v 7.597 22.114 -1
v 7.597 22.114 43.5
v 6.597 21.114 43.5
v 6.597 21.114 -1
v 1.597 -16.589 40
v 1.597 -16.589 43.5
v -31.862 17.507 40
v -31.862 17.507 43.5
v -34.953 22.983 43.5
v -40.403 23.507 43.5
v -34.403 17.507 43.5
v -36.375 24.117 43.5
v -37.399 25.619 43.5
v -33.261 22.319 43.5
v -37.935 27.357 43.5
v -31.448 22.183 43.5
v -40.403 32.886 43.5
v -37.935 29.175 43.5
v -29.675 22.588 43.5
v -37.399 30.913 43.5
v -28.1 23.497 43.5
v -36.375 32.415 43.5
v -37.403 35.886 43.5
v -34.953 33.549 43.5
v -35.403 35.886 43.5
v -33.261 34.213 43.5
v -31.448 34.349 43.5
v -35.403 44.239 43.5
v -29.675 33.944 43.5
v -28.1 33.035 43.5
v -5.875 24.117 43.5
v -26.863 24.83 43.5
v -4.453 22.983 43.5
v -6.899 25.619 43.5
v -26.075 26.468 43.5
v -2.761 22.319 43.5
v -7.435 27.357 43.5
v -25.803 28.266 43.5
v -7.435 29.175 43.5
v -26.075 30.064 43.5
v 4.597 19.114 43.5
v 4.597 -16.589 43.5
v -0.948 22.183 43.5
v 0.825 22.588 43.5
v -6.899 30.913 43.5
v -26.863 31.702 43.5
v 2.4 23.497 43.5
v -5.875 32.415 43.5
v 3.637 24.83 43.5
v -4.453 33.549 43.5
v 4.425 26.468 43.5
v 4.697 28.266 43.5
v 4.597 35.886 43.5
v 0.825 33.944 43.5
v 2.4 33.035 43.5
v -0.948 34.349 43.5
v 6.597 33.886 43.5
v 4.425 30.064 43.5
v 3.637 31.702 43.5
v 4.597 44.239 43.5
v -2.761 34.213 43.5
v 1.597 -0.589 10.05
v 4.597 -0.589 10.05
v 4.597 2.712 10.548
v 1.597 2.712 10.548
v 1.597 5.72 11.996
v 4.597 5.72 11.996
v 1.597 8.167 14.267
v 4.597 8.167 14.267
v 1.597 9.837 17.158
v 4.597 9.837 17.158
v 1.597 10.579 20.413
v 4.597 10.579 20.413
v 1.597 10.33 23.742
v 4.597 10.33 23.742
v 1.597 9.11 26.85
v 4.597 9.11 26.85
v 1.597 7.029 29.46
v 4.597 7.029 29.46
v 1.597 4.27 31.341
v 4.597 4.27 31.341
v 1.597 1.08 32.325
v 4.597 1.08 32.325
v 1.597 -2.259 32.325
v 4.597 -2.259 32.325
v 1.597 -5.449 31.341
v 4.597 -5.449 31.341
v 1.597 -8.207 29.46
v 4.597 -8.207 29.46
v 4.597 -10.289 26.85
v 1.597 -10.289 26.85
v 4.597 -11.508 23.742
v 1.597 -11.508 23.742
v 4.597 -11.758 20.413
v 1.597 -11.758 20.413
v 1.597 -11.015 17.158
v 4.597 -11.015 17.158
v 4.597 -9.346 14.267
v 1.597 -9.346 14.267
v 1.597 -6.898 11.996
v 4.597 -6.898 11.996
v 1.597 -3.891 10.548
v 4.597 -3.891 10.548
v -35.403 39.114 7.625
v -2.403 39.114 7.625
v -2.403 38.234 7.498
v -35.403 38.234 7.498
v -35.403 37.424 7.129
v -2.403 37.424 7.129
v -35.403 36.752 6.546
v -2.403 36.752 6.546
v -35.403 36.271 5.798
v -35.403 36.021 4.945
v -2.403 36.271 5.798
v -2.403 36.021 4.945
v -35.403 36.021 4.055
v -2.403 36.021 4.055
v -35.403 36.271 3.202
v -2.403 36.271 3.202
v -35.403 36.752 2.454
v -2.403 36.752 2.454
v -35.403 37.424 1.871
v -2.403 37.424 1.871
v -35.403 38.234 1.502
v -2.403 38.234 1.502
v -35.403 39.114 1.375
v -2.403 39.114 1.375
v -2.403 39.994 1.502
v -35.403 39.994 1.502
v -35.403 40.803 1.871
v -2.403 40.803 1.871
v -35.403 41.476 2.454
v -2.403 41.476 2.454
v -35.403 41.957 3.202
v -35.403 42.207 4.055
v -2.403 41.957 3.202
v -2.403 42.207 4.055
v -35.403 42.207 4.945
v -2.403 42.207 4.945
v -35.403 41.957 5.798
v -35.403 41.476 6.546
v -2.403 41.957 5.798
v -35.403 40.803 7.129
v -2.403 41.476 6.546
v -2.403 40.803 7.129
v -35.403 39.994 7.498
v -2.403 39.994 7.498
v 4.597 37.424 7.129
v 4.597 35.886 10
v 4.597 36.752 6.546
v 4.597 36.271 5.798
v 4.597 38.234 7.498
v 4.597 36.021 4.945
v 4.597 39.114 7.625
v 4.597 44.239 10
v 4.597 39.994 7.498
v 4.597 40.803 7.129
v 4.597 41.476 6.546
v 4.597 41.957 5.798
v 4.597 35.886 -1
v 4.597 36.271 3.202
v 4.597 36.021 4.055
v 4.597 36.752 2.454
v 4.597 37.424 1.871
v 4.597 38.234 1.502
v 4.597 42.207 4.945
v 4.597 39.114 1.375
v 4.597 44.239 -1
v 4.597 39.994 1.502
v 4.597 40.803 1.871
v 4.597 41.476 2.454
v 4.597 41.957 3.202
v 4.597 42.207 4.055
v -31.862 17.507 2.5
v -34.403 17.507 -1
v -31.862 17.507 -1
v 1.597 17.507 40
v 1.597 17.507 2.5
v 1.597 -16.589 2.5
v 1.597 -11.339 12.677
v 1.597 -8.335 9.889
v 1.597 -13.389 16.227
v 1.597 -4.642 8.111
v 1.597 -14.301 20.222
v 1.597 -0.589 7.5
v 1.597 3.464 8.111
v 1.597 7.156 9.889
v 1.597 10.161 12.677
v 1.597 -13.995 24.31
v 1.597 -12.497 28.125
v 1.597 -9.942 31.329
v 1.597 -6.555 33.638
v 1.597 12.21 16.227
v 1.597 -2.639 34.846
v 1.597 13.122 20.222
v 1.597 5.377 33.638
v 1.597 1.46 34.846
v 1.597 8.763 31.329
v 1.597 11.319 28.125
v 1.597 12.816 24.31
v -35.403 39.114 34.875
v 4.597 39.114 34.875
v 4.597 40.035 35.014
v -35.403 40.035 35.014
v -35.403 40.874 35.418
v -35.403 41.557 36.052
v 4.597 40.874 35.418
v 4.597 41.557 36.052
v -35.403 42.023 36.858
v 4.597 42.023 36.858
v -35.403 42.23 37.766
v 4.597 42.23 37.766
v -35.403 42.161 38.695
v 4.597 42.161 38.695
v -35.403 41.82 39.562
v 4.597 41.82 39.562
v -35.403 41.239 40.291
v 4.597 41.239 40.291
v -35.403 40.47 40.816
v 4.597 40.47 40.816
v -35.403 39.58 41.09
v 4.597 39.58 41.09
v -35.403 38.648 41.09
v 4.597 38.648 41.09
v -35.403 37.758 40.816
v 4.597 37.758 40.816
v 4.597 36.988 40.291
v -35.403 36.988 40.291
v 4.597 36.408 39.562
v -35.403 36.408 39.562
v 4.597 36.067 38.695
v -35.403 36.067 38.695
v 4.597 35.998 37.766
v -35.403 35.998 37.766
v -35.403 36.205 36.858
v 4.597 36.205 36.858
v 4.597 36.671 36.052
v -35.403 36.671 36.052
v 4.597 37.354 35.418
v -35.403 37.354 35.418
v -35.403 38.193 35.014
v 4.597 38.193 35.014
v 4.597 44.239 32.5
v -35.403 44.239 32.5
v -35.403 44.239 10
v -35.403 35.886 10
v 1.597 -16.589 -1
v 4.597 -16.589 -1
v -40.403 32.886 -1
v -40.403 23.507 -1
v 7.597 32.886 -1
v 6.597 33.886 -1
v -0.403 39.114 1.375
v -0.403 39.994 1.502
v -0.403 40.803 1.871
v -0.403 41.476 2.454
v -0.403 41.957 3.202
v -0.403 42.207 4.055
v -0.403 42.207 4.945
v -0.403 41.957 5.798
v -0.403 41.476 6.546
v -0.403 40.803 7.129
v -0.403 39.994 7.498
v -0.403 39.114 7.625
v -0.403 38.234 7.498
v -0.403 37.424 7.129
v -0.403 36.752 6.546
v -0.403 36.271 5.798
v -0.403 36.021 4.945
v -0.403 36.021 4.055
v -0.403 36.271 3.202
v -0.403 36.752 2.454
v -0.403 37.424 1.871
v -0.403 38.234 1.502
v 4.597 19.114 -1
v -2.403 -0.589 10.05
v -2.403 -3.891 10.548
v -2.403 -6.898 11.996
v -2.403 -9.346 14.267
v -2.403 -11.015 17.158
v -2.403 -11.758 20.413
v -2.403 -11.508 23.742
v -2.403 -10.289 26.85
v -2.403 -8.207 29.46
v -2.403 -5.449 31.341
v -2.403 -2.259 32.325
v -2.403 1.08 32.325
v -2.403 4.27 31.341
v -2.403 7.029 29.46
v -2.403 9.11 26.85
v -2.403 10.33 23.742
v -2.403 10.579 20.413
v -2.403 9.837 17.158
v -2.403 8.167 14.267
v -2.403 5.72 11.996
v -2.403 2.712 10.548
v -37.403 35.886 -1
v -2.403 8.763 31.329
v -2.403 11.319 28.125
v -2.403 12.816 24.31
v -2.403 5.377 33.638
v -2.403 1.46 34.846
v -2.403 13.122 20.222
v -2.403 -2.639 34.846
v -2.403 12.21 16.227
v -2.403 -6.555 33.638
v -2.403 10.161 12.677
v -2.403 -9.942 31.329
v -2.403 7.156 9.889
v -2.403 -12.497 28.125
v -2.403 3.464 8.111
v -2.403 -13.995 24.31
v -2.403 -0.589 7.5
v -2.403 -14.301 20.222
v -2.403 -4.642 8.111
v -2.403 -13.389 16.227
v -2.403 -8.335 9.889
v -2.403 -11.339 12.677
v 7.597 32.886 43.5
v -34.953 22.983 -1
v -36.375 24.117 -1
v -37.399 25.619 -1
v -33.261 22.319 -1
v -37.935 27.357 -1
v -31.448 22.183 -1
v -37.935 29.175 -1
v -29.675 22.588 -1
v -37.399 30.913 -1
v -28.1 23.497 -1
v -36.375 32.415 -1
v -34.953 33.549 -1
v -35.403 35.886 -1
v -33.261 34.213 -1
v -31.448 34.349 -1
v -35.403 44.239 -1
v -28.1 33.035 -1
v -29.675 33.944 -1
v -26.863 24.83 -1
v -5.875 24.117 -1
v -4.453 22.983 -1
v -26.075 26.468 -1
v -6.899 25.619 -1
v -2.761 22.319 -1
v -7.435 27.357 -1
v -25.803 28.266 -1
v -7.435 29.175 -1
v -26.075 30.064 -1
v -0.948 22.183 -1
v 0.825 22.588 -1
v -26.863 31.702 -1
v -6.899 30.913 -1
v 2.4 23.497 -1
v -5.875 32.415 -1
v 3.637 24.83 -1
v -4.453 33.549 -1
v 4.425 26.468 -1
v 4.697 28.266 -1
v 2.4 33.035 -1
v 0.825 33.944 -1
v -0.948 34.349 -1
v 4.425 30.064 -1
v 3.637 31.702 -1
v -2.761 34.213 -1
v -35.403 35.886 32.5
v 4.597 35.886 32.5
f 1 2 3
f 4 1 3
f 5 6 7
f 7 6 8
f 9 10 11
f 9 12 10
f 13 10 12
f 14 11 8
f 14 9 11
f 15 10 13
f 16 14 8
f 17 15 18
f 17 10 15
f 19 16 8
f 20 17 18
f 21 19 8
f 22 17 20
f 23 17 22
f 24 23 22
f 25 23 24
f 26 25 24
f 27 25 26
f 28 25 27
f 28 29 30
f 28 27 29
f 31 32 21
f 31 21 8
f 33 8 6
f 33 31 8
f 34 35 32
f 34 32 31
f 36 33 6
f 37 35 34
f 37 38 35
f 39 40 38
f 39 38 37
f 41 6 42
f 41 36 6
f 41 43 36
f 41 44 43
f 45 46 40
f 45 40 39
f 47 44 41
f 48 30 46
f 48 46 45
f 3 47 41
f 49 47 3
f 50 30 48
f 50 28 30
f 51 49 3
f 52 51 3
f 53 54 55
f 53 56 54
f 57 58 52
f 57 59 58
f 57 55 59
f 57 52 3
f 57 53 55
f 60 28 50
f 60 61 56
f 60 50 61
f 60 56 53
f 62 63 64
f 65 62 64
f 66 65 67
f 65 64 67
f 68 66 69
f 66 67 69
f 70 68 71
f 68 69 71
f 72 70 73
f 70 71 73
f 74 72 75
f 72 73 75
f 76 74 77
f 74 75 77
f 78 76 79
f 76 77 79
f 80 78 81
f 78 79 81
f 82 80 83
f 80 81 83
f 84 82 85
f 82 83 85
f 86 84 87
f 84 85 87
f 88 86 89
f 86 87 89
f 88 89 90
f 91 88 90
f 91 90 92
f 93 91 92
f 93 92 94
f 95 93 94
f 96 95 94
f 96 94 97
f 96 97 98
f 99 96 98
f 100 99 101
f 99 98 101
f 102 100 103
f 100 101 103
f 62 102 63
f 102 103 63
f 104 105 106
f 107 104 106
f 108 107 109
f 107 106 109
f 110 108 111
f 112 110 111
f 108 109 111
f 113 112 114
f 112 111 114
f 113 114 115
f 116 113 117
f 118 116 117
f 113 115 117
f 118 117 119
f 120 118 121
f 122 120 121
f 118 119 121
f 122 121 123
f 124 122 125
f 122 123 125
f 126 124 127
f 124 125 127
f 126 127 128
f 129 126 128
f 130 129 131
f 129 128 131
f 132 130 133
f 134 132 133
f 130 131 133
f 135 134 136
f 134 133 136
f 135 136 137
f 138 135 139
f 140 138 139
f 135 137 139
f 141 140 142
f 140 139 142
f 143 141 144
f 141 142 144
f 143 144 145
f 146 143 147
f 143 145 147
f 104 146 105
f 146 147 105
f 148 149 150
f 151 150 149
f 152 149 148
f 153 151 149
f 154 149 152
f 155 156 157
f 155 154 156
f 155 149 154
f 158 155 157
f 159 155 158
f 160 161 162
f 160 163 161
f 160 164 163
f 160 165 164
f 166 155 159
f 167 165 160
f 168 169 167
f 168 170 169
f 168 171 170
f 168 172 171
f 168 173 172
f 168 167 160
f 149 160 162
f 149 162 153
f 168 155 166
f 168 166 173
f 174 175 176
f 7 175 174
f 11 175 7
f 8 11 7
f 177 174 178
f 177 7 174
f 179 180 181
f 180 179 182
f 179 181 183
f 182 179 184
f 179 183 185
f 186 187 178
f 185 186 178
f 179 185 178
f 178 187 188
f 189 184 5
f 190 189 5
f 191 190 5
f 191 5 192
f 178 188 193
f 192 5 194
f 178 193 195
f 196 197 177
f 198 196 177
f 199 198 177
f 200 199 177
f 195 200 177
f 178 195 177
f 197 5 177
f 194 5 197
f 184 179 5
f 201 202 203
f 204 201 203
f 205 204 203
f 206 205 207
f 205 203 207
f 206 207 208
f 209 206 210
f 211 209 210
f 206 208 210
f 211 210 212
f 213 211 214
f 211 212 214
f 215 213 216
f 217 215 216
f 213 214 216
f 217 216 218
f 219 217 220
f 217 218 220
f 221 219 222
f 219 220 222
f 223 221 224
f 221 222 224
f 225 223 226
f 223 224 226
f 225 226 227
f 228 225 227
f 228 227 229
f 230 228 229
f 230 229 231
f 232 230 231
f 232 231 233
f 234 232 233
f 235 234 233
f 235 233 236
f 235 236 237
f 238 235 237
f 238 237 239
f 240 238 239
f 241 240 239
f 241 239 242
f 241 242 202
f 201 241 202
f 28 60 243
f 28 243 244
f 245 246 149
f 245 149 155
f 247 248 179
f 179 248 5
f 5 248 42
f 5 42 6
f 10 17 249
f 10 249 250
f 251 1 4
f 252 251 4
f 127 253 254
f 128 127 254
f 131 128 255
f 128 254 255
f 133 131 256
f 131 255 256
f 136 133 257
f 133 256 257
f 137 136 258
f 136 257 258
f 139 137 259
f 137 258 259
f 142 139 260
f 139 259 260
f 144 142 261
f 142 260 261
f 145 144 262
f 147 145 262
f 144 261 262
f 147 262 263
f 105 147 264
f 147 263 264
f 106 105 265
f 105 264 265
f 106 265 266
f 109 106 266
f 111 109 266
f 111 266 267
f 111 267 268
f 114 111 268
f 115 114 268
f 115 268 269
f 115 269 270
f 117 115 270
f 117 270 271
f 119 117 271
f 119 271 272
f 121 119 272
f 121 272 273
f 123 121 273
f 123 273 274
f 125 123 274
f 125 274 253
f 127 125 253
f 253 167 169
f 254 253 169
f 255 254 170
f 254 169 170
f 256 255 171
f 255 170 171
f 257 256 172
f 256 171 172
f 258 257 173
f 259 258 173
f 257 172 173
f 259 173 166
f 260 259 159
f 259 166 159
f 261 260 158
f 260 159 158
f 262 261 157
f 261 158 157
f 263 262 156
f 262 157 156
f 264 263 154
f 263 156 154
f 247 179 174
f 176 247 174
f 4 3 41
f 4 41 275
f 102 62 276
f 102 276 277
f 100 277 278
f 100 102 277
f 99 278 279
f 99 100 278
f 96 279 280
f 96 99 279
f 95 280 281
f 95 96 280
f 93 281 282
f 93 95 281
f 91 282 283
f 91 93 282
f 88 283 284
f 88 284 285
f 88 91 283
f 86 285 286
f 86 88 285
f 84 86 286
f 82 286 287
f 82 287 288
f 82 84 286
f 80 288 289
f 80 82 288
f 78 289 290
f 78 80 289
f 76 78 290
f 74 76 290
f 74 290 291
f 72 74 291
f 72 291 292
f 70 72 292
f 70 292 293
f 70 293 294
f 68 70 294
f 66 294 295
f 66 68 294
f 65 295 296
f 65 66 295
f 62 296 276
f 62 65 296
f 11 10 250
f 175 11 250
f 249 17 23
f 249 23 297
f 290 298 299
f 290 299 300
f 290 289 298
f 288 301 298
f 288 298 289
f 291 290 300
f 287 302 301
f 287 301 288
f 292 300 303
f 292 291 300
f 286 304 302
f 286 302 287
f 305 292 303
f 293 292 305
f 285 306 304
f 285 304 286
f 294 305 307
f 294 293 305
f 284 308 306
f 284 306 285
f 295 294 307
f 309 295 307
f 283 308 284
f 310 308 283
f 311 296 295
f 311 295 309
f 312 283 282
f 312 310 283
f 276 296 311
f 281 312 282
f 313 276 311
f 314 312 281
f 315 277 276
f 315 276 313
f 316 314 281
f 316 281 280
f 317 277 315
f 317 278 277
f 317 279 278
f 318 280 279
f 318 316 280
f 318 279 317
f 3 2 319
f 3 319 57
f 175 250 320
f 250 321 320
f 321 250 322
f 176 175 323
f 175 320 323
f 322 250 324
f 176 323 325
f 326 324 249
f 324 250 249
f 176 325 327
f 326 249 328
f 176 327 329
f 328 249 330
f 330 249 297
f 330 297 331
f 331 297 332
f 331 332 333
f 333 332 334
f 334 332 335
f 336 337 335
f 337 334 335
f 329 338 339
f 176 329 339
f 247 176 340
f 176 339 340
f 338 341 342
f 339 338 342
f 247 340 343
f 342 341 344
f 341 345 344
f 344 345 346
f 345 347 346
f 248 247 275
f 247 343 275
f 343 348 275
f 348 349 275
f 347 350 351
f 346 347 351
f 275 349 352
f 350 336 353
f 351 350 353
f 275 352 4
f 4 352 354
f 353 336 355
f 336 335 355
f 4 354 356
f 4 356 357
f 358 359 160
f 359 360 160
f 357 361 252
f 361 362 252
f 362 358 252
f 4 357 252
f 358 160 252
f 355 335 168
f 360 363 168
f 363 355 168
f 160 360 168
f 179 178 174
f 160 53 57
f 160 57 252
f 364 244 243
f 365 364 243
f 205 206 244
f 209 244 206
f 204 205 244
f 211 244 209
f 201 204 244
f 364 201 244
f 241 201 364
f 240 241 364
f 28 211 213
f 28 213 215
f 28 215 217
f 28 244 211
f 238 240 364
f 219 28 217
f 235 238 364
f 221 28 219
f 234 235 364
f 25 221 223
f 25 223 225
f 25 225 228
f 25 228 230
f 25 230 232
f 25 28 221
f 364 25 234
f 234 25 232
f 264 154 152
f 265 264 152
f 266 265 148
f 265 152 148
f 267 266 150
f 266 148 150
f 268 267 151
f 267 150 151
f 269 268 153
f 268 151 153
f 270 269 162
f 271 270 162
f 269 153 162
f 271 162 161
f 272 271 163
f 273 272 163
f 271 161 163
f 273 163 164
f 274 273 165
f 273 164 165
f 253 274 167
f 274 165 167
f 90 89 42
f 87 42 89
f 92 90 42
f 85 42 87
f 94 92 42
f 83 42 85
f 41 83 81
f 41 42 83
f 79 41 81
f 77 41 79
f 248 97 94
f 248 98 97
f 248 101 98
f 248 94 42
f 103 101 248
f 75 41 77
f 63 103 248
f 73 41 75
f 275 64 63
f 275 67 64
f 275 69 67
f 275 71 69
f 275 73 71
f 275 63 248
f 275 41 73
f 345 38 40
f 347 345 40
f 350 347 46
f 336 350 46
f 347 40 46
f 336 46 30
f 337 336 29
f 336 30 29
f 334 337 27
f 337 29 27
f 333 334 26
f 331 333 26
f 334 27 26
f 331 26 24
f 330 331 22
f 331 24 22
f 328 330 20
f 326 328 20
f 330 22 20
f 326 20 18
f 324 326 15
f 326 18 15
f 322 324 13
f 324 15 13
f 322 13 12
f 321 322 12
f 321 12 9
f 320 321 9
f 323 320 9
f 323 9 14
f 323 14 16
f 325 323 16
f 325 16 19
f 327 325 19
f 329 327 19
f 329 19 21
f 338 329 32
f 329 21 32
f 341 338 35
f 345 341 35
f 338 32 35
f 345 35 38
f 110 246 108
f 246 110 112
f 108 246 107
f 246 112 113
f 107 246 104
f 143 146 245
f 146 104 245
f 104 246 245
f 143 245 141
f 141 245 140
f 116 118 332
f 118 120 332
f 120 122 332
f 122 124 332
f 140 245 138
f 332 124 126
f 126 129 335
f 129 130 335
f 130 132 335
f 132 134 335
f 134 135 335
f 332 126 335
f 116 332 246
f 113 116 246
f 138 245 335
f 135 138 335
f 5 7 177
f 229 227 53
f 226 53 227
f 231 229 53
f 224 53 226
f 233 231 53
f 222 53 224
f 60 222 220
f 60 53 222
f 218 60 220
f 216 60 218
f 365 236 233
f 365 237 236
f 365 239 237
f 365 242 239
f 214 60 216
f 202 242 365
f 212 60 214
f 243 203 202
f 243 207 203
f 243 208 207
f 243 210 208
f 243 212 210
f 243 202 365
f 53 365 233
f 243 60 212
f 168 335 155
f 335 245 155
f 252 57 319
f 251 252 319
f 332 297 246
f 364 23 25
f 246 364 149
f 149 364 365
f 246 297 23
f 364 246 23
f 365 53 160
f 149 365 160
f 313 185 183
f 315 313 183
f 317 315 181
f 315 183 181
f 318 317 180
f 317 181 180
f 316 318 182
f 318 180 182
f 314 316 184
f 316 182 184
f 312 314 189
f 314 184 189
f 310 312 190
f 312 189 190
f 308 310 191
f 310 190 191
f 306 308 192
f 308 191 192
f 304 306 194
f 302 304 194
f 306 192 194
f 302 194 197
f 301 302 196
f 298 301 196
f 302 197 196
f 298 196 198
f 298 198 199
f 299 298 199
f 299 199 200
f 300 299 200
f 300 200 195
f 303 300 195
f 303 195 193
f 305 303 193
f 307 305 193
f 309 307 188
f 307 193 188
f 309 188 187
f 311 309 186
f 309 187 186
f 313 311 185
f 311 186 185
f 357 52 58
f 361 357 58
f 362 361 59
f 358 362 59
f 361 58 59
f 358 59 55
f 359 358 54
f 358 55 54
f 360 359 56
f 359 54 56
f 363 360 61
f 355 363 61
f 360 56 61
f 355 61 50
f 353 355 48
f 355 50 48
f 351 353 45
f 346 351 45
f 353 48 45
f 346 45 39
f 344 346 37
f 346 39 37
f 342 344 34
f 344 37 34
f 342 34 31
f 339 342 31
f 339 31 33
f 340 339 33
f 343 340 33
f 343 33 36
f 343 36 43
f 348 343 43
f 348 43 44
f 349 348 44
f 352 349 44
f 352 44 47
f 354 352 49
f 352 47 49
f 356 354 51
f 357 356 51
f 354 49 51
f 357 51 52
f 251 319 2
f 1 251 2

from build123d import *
from build123d.topology import SkipClean

# Parameters (mm, degrees)
SKETCH1_W            = 42.5
SKETCH1_H            = 55.85
BOSS_EXTRUDE2_DEPTH  = 42.5
SKETCH5_R            = 3.175
CUT_EXTRUDE2_DEPTH   = 42.5
SKETCH6_W            = 42.5
SKETCH6_H            = 42.5
CUT_EXTRUDE3_DEPTH   = 39.5
SKETCH7_R            = 12
SKETCH7_R_2          = 1.5
CUT_EXTRUDE4_DEPTH   = 39.5
SKETCH9_W            = 10
SKETCH9_H            = 42.5
CUT_EXTRUDE5_DEPTH   = 39.5
CHAMFER1_SIZE        = 3
CHAMFER2_SIZE        = 2
SKETCH10_W           = 2
SKETCH10_H           = 2.12759362
BOSS_EXTRUDE3_DEPTH  = 3
SKETCH12_W           = 2
SKETCH12_H           = 3
BOSS_EXTRUDE4_DEPTH  = 3
BOSS_EXTRUDE5_DEPTH  = 2
BOSS_EXTRUDE6_DEPTH  = 2
SKETCH16_W           = 9
SKETCH16_H           = 14.17
SKETCH16_R           = 3.125
BOSS_EXTRUDE8_DEPTH  = 5
SKETCH18_W           = 9
SKETCH18_H           = 12.353282928
BOSS_EXTRUDE9_DEPTH  = 2
SKETCH20_W           = 36.5
SKETCH20_H           = 45.261647475
CUT_EXTRUDE9_DEPTH   = 66
CUT_EXTRUDE10_DEPTH  = 66
SKETCH22_R           = 12.5
SKETCH22_R_2         = 11.2
SKETCH22_R_3         = 2
BOSS_EXTRUDE13_DEPTH = 3
SKETCH23_W           = 42.5
SKETCH23_H           = 7.37509362
CUT_EXTRUDE11_DEPTH  = 3
CHAMFER3_SIZE        = 2
SKETCH24_R           = 13.75
SKETCH24_R_2         = 11.2
BOSS_EXTRUDE14_DEPTH = 4
BOSS_EXTRUDE15_DEPTH = 2.5
BOSS_EXTRUDE16_DEPTH = 2.5
SKETCH28_W           = 3
SKETCH28_H           = 2
BOSS_EXTRUDE17_DEPTH = 42.5
SKETCH29_W           = 1
SKETCH29_H           = 12.353282928
BOSS_EXTRUDE18_DEPTH = 7
BOSS_EXTRUDE19_START = 1
SKETCH31_R           = 3.175
BOSS_EXTRUDE19_DEPTH = 1
SKETCH32_R           = 3.175
BOSS_EXTRUDE20_DEPTH = 1
BOSS_EXTRUDE21_DEPTH = 1
SKETCH34_W           = 11
SKETCH34_H           = 8.5
SKETCH34_R           = 3.125
SKETCH34_H_2         = 13.67
BOSS_EXTRUDE22_DEPTH = 40
SKETCH35_R           = 3.125
CUT_EXTRUDE13_DEPTH  = 52
BOSS_EXTRUDE23_DEPTH = 11
SKETCH37_W           = 22.5
SKETCH37_H           = 4
BOSS_EXTRUDE24_DEPTH = 43
SKETCH38_W           = 3.111297042
SKETCH38_H           = 14.426321109
BOSS_EXTRUDE25_DEPTH = 44.5
SKETCH39_W           = 1.127935157
SKETCH39_H           = 1.723234268
BOSS_EXTRUDE26_DEPTH = 44.5
BOSS_EXTRUDE27_DEPTH = 44.5
SKETCH42_W           = 2
SKETCH42_H           = 16.771333713
BOSS_EXTRUDE28_DEPTH = 44.5
CHAMFER4_SIZE        = 2
CHAMFER5_SIZE        = 3
SKETCH40_R           = 6.1
CUT_EXTRUDE14_DEPTH  = 44.5
CHAMFER6_SIZE        = 6
SKETCH44_W           = 37.5
SKETCH44_H           = 3.156682669
BOSS_EXTRUDE32_DEPTH = 38.5
SKETCH45_W           = 2.465771705
SKETCH45_H           = 2.227148637
BOSS_EXTRUDE33_DEPTH = 44.5
BOSS_EXTRUDE34_DEPTH = 44.5


with BuildPart() as part:
    # Sketch1 → Boss-Extrude2 (new body)
    with BuildSketch(Plane.XY):
        with Locations((-16.653499003, 3.960644895)):
            Rectangle(SKETCH1_W, SKETCH1_H)
    extrude(amount=BOSS_EXTRUDE2_DEPTH)

    # Sketch5 → Cut-Extrude2 (cut)
    with BuildSketch(Plane.XY.offset(42.5)):
        with Locations((-31.903499003, 25.965832134)):
            Circle(SKETCH5_R)
        with Locations(Location((-1.403499003, 25.965832134, 0), (0, 0, 180))):
            Circle(SKETCH5_R)
    extrude(amount=-CUT_EXTRUDE2_DEPTH, mode=Mode.SUBTRACT)

    # Sketch6 → Cut-Extrude3 (cut)
    with BuildSketch(Plane.ZY.offset(37.903499003)):
        with Locations((21.25, -0.586761485)):
            Rectangle(SKETCH6_W, SKETCH6_H)
    extrude(amount=-CUT_EXTRUDE3_DEPTH, mode=Mode.SUBTRACT)

    # Sketch7 → Cut-Extrude4 (cut)
    with BuildSketch(Plane(origin=(4.596500997, 0, 0), x_dir=(0, 0, -1), z_dir=(1, 0, 0))):
        with Locations((-21.25, -0.586761485)):
            Circle(SKETCH7_R)
        with Locations((-37, -16.336761485)):
            Circle(SKETCH7_R_2)
        with Locations((-5.5, -16.336761485)):
            Circle(SKETCH7_R_2)
        with Locations((-37, 14.663238515)):
            Circle(SKETCH7_R_2)
        with Locations((-5.5, 14.663238515)):
            Circle(SKETCH7_R_2)
    extrude(amount=-CUT_EXTRUDE4_DEPTH, mode=Mode.SUBTRACT)

    # Sketch9 → Cut-Extrude5 (cut)
    with BuildSketch(Plane.XZ.offset(23.964355105)):
        with Locations((-32.903499003, 21.25)):
            Rectangle(SKETCH9_W, SKETCH9_H)
    extrude(amount=-CUT_EXTRUDE5_DEPTH, mode=Mode.SUBTRACT)

    # Chamfer1
    chamfer1_edges = [part.edges().sort_by_distance(p)[0] for p in [
        (-37.903499003, 20.663238515, 21.25),
        (-37.903499003, 31.885644895, 21.25),
    ]]
    chamfer(chamfer1_edges, length=CHAMFER1_SIZE)

    # Chamfer2
    chamfer2_edges = [part.edges().sort_by_distance(p)[0] for p in [
        (4.596500997, -23.964355105, 21.25),
    ]]
    chamfer(chamfer2_edges, length=CHAMFER2_SIZE)

    # Sketch10 → Boss-Extrude3 (add)
    with BuildSketch(Plane.ZY.offset(27.903499003)):
        with Locations((43.5, -22.900558295)):
            Rectangle(SKETCH10_W, SKETCH10_H)
        with Locations((-1, -22.900558295)):
            Rectangle(SKETCH10_W, SKETCH10_H)
    extrude(amount=-BOSS_EXTRUDE3_DEPTH)

    # Sketch12 → Boss-Extrude4 (add)
    with BuildSketch(Plane.ZY.offset(-1.596500997)):
        with Locations((43.5, 19.163238515)):
            Rectangle(SKETCH12_W, SKETCH12_H)
        with Locations((-1, 19.163238515)):
            Rectangle(SKETCH12_W, SKETCH12_H)
    extrude(amount=-BOSS_EXTRUDE4_DEPTH)

    # Sketch13 → Boss-Extrude5 (add)
    with BuildSketch(Plane(origin=(0, 0, -2), x_dir=(-1, 0, 0), z_dir=(0, 0, -1))):
        Polygon((-1.596500997, 17.663238515), (24.903499003, -21.836761485), (27.903499003, -21.836761485), (-1.596500997, 20.663238515), align=None)
    extrude(amount=-BOSS_EXTRUDE5_DEPTH)

    # Sketch14 → Boss-Extrude6 (add)
    with BuildSketch(Plane.XY.offset(44.5)):
        Polygon((1.596500997, 17.663238515), (-24.903499003, -21.836761485), (-27.903499003, -21.836761485), (1.596500997, 20.663238515), align=None)
    extrude(amount=-BOSS_EXTRUDE6_DEPTH)

    # Sketch16 → Boss-Extrude8 (add)
    # profile 1 of 2: a face of its own
    with BuildSketch(Plane(origin=(4.596500997, 0, 0), x_dir=(0, 0, -1), z_dir=(1, 0, 0))):
        with Locations((-38, 37.153927823)):
            Rectangle(SKETCH16_W, SKETCH16_H)
        with Locations((-38, 39.113927823)):
            Circle(SKETCH16_R, mode=Mode.SUBTRACT)
    # profile 2 of 2: a face of its own
    with BuildSketch(Plane(origin=(4.596500997, 0, 0), x_dir=(0, 0, -1), z_dir=(1, 0, 0))):
        with Locations((-4.5, 37.153927823)):
            Rectangle(SKETCH16_W, SKETCH16_H)
        with Locations(Location((-4.5, 39.113927823, 0), (0, 0, 180))):
            Circle(SKETCH16_R, mode=Mode.SUBTRACT)
    extrude(amount=-BOSS_EXTRUDE8_DEPTH)

    # Sketch18 → Boss-Extrude9 (add)
    with BuildSketch(Plane.ZY.offset(0.403499003)):
        with Locations((4.5, 38.062286359)):
            Rectangle(SKETCH18_W, SKETCH18_H)
        with Locations((38, 38.062286359)):
            Rectangle(SKETCH18_W, SKETCH18_H)
    extrude(amount=BOSS_EXTRUDE9_DEPTH)

    # Sketch20 → Cut-Extrude9 (cut, symmetric)
    with BuildSketch(Plane.XY.offset(42.5)):
        with Locations((-16.653499003, -1.967585223)):
            Rectangle(SKETCH20_W, SKETCH20_H)
    extrude(amount=CUT_EXTRUDE9_DEPTH, both=True, mode=Mode.SUBTRACT)

    # Sketch21 → Cut-Extrude10 (cut, symmetric)
    with BuildSketch(Plane(origin=(4.596500997, 0, 0), x_dir=(0, 0, -1), z_dir=(1, 0, 0))):
        Polygon((0, 44.238927823), (0, -21.964355105), (2.461652374, -21.964355105), (3.037977258, 44.238927823), (0.568013469, 44.238927823), align=None)
        Polygon((-42.5, 44.238927823), (-42.5, -21.964355105), (-44.961652374, -21.964355105), (-45.537977258, 44.238927823), (-43.068013469, 44.238927823), align=None)
    extrude(amount=CUT_EXTRUDE10_DEPTH, both=True, mode=Mode.SUBTRACT)

    # Sketch22 → Boss-Extrude13 (add)
    # profile 1 of 5: a face of its own
    with BuildSketch(Plane(origin=(4.596500997, 0, 0), x_dir=(0, 0, -1), z_dir=(1, 0, 0))):
        with Locations((-21.25, -0.499261485)):
            Circle(SKETCH22_R)
        with Locations((-21.25, -0.589261485)):
            Circle(SKETCH22_R_2, mode=Mode.SUBTRACT)
    # profile 2 of 5: a face of its own
    with BuildSketch(Plane(origin=(4.596500997, 0, 0), x_dir=(0, 0, -1), z_dir=(1, 0, 0))):
        with Locations((-37, 14.663238515)):
            Circle(SKETCH22_R_3)
    # profile 3 of 5: a face of its own
    with BuildSketch(Plane(origin=(4.596500997, 0, 0), x_dir=(0, 0, -1), z_dir=(1, 0, 0))):
        with Locations((-5.524563877, 14.750738515)):
            Circle(SKETCH22_R_3)
    # profile 4 of 5: a face of its own
    with BuildSketch(Plane(origin=(4.596500997, 0, 0), x_dir=(0, 0, -1), z_dir=(1, 0, 0))):
        with Locations((-5.5, -16.336761485)):
            Circle(SKETCH22_R_3)
    # profile 5 of 5: a face of its own
    with BuildSketch(Plane(origin=(4.596500997, 0, 0), x_dir=(0, 0, -1), z_dir=(1, 0, 0))):
        with Locations((-37, -16.336761485)):
            Circle(SKETCH22_R_3)
    extrude(amount=-BOSS_EXTRUDE13_DEPTH)

    # Sketch23 → Cut-Extrude11 (cut)
    with BuildSketch(Plane(origin=(4.596500997, 0, 0), x_dir=(0, 0, -1), z_dir=(1, 0, 0))):
        with Locations((-21.25, -20.276808295)):
            Rectangle(SKETCH23_W, SKETCH23_H)
    extrude(amount=-CUT_EXTRUDE11_DEPTH, mode=Mode.SUBTRACT)

    # Chamfer3
    chamfer3_edges = [part.edges().sort_by_distance(p)[0] for p in [
        (4.596500997, -16.589261485, 21.25),
    ]]
    chamfer(chamfer3_edges, length=CHAMFER3_SIZE)

    # Sketch24 → Boss-Extrude14 (add)
    with BuildSketch(Plane.ZY.offset(-1.596500997)):
        with Locations(Location((21.25, -0.589261485, 0), (0, 0, 180))):
            Circle(SKETCH24_R)
        with Locations(Location((21.25, -0.589261485, 0), (0, 0, 180))):
            Circle(SKETCH24_R_2, mode=Mode.SUBTRACT)
    extrude(amount=BOSS_EXTRUDE14_DEPTH)

    # Sketch25 → Boss-Extrude15 (add)
    with BuildSketch(Plane.XY.offset(42.5)):
        Polygon((-34.903499003, 20.663238515), (1.596500997, -16.589261485), (1.596500997, 20.663238515), align=None)
    extrude(amount=-BOSS_EXTRUDE15_DEPTH)

    # Sketch26 → Boss-Extrude16 (add)
    with BuildSketch(Plane(origin=(0, 0, 0), x_dir=(-1, 0, 0), z_dir=(0, 0, -1))):
        Polygon((-1.596500997, 20.663238515), (-1.596500997, -16.589261485), (34.903499003, 20.663238515), align=None)
    extrude(amount=-BOSS_EXTRUDE16_DEPTH)

    # Sketch28 → Boss-Extrude17 (add)
    with BuildSketch(Plane.XY.offset(42.5)):
        with Locations((3.096500997, -15.589261485)):
            Rectangle(SKETCH28_W, SKETCH28_H)
    extrude(amount=-BOSS_EXTRUDE17_DEPTH)

    # Sketch29 → Boss-Extrude18 (add)
    with BuildSketch(Plane(origin=(4.596500997, 0, 0), x_dir=(0, 0, -1), z_dir=(1, 0, 0))):
        with Locations((-33, 38.062286359)):
            Rectangle(SKETCH29_W, SKETCH29_H)
        with Locations((-9.5, 38.062286359)):
            Rectangle(SKETCH29_W, SKETCH29_H)
    extrude(amount=-BOSS_EXTRUDE18_DEPTH)

    # Sketch31 → Boss-Extrude19 (add)
    with BuildSketch(Plane.XY.offset(42.5).offset(BOSS_EXTRUDE19_START)):
        Polygon((-37.903499003, 28.885644895), (-37.903499003, 23.663238515), (1.596500997, -16.589261485), (4.596500997, -16.589261485), (4.596500997, 44.238927823), (-2.403499003, 44.238927823), (-2.403499003, 31.885644895), (-34.903499003, 31.885644895), align=None)
        with Locations((-31.903499003, 25.965832134)):
            Circle(SKETCH31_R, mode=Mode.SUBTRACT)
        with Locations((-1.403499003, 25.965832134)):
            Circle(SKETCH31_R, mode=Mode.SUBTRACT)
    extrude(amount=-BOSS_EXTRUDE19_DEPTH)

    # Sketch32 → Boss-Extrude20 (add)
    with BuildSketch(Plane(origin=(0, 0, 0), x_dir=(-1, 0, 0), z_dir=(0, 0, -1))):
        Polygon((-4.596500997, 44.238927823), (-4.596500997, -16.589261485), (-1.596500997, -16.589261485), (37.903499003, 23.663238515), (37.903499003, 28.885644895), (34.903499003, 31.885644895), (2.403499003, 31.885644895), (2.403499003, 44.238927823), align=None)
        with Locations(Location((1.403499003, 25.965832134, 0), (0, 0, 180))):
            Circle(SKETCH32_R, mode=Mode.SUBTRACT)
        with Locations(Location((31.903499003, 25.965832134, 0), (0, 0, 180))):
            Circle(SKETCH32_R, mode=Mode.SUBTRACT)
    extrude(amount=BOSS_EXTRUDE20_DEPTH)

    # Sketch33 → Boss-Extrude21 (add)
    with BuildSketch(Plane(origin=(-7.479841124, -7.340009301, 0), x_dir=(0, 0, 1), z_dir=(-0.7137468745682252, -0.7004037400272006, 0))):
        Polygon((-1, 43.437314994), (-1, -12.958728806), (2.5, -12.958728806), (2.5, 39.19486315), (40, 39.19486315), (40, -12.958728806), (43.5, -12.958728806), (43.5, 43.437314994), align=None)
    extrude(amount=-BOSS_EXTRUDE21_DEPTH)

    # Sketch34 → Boss-Extrude22 (add)
    # profile 1 of 2: a face of its own
    with BuildSketch(Plane(origin=(4.596500997, 0, 0), x_dir=(0, 0, -1), z_dir=(1, 0, 0))):
        with Locations((-38, 39.988927823)):
            Rectangle(SKETCH34_W, SKETCH34_H)
        with Locations((-38, 39.113927823)):
            Circle(SKETCH34_R, mode=Mode.SUBTRACT)
    # profile 2 of 2: a face of its own
    with BuildSketch(Plane(origin=(4.596500997, 0, 0), x_dir=(0, 0, -1), z_dir=(1, 0, 0))):
        with Locations((-4.5, 37.403927823)):
            Rectangle(SKETCH34_W, SKETCH34_H_2)
        with Locations(Location((-4.5, 39.113927823, 0), (0, 0, 180))):
            Circle(SKETCH34_R, mode=Mode.SUBTRACT)
    extrude(amount=-BOSS_EXTRUDE22_DEPTH)

    # Sketch35 → Cut-Extrude13 (cut)
    with BuildSketch(Plane(origin=(4.596500997, 0, 0), x_dir=(0, 0, -1), z_dir=(1, 0, 0))):
        with Locations((-38, 39.113927823)):
            Circle(SKETCH35_R)
        with Locations((-4.5, 39.113927823)):
            Circle(SKETCH35_R)
    extrude(amount=-CUT_EXTRUDE13_DEPTH, mode=Mode.SUBTRACT)

    # Sketch36 → Boss-Extrude23 (add)
    with BuildSketch(Plane.XY.offset(43.5)):
        Polygon((-35.403499003, 35.738927823), (-35.403499003, 31.385644895), (-34.903499003, 31.885644895), (-2.403499003, 31.885644895), (-2.403499003, 35.738927823), align=None)
    extrude(amount=-BOSS_EXTRUDE23_DEPTH)

    # Sketch37 → Boss-Extrude24 (add)
    with BuildSketch(Plane(origin=(4.596500997, 0, 0), x_dir=(0, 0, -1), z_dir=(1, 0, 0))):
        with Locations((-21.25, 33.885644895)):
            Rectangle(SKETCH37_W, SKETCH37_H)
    extrude(amount=-BOSS_EXTRUDE24_DEPTH)

    # Sketch38 → Boss-Extrude25 (add)
    with BuildSketch(Plane.XY.offset(43.5)):
        with Locations((-36.847850482, 28.672484341)):
            Rectangle(SKETCH38_W, SKETCH38_H)
    extrude(amount=-BOSS_EXTRUDE25_DEPTH)

    # Sketch39 → Boss-Extrude26 (add)
    with BuildSketch(Plane(origin=(0, 0, -1), x_dir=(-1, 0, 0), z_dir=(0, 0, -1))):
        with Locations((35.21666709, 31.599834129)):
            Rectangle(SKETCH39_W, SKETCH39_H)
    extrude(amount=-BOSS_EXTRUDE26_DEPTH)

    # Sketch41 → Boss-Extrude27 (add)
    with BuildSketch(Plane.XY.offset(43.5)):
        Polygon((-38.403499003, 35.885644895), (-40.403499003, 35.885644895), (-40.403499003, 21.459323786), (-40.403499003, 17.506555846), (-31.861912383, 17.506555846), (-35.740785337, 21.459323786), (-38.403499003, 21.459323786), align=None)
    extrude(amount=-BOSS_EXTRUDE27_DEPTH)

    # Sketch42 → Boss-Extrude28 (add)
    with BuildSketch(Plane.XY.offset(43.5)):
        with Locations((5.596500997, 27.499978039)):
            Rectangle(SKETCH42_W, SKETCH42_H)
    extrude(amount=-BOSS_EXTRUDE28_DEPTH)

    # Chamfer4
    chamfer4_edges = [part.edges().sort_by_distance(p)[0] for p in [
        (6.596500997, 19.114311182, 21.25),
        (6.596500997, 35.885644895, 21.25),
    ]]
    chamfer(chamfer4_edges, length=CHAMFER4_SIZE - 0.0001)  # a hair under: the kernel refuses the full size

    # Chamfer5
    chamfer5_edges = [part.edges().sort_by_distance(p)[0] for p in [
        (-40.403499003, 35.885644895, 21.25),
    ]]
    chamfer(chamfer5_edges, length=CHAMFER5_SIZE)

    # Sketch40 → Cut-Extrude14 (cut)
    with BuildSketch(Plane.XY.offset(43.5)):
        with Locations((-31.903499003, 28.265832134)):
            Circle(SKETCH40_R)
        with Locations((-1.403499003, 28.265832134)):
            Circle(SKETCH40_R)
    extrude(amount=-CUT_EXTRUDE14_DEPTH, mode=Mode.SUBTRACT)

    # Chamfer6
    chamfer6_edges = [part.edges().sort_by_distance(p)[0] for p in [
        (-40.403499003, 17.506555846, 21.25),
    ]]
    chamfer(chamfer6_edges, length=CHAMFER6_SIZE)

    # Sketch44 → Boss-Extrude32 (add)
    with BuildSketch(Plane(origin=(4.596500997, 0, 0), x_dir=(0, 0, -1), z_dir=(1, 0, 0))):
        with Locations((-21.25, 19.084897181)):
            Rectangle(SKETCH44_W, SKETCH44_H)
    extrude(amount=-BOSS_EXTRUDE32_DEPTH)

    # Sketch45 → Boss-Extrude33 (add)
    with BuildSketch(Plane.XY.offset(43.5)):
        with Locations((-34.362753496, 20.148344478)):
            Rectangle(SKETCH45_W, SKETCH45_H)
    extrude(amount=-BOSS_EXTRUDE33_DEPTH)

    # Sketch47 → Boss-Extrude34 (add)
    with SkipClean():  # the faces are left unmerged after this step: merging them gives an invalid solid
        with BuildSketch(Plane.XY.offset(43.5)):
            Polygon((6.596500997, 33.885644895), (7.596500997, 32.885644895), (7.596500997, 22.114311182), (6.596500997, 21.114311182), align=None)
        extrude(amount=-BOSS_EXTRUDE34_DEPTH)


solid = part.part
